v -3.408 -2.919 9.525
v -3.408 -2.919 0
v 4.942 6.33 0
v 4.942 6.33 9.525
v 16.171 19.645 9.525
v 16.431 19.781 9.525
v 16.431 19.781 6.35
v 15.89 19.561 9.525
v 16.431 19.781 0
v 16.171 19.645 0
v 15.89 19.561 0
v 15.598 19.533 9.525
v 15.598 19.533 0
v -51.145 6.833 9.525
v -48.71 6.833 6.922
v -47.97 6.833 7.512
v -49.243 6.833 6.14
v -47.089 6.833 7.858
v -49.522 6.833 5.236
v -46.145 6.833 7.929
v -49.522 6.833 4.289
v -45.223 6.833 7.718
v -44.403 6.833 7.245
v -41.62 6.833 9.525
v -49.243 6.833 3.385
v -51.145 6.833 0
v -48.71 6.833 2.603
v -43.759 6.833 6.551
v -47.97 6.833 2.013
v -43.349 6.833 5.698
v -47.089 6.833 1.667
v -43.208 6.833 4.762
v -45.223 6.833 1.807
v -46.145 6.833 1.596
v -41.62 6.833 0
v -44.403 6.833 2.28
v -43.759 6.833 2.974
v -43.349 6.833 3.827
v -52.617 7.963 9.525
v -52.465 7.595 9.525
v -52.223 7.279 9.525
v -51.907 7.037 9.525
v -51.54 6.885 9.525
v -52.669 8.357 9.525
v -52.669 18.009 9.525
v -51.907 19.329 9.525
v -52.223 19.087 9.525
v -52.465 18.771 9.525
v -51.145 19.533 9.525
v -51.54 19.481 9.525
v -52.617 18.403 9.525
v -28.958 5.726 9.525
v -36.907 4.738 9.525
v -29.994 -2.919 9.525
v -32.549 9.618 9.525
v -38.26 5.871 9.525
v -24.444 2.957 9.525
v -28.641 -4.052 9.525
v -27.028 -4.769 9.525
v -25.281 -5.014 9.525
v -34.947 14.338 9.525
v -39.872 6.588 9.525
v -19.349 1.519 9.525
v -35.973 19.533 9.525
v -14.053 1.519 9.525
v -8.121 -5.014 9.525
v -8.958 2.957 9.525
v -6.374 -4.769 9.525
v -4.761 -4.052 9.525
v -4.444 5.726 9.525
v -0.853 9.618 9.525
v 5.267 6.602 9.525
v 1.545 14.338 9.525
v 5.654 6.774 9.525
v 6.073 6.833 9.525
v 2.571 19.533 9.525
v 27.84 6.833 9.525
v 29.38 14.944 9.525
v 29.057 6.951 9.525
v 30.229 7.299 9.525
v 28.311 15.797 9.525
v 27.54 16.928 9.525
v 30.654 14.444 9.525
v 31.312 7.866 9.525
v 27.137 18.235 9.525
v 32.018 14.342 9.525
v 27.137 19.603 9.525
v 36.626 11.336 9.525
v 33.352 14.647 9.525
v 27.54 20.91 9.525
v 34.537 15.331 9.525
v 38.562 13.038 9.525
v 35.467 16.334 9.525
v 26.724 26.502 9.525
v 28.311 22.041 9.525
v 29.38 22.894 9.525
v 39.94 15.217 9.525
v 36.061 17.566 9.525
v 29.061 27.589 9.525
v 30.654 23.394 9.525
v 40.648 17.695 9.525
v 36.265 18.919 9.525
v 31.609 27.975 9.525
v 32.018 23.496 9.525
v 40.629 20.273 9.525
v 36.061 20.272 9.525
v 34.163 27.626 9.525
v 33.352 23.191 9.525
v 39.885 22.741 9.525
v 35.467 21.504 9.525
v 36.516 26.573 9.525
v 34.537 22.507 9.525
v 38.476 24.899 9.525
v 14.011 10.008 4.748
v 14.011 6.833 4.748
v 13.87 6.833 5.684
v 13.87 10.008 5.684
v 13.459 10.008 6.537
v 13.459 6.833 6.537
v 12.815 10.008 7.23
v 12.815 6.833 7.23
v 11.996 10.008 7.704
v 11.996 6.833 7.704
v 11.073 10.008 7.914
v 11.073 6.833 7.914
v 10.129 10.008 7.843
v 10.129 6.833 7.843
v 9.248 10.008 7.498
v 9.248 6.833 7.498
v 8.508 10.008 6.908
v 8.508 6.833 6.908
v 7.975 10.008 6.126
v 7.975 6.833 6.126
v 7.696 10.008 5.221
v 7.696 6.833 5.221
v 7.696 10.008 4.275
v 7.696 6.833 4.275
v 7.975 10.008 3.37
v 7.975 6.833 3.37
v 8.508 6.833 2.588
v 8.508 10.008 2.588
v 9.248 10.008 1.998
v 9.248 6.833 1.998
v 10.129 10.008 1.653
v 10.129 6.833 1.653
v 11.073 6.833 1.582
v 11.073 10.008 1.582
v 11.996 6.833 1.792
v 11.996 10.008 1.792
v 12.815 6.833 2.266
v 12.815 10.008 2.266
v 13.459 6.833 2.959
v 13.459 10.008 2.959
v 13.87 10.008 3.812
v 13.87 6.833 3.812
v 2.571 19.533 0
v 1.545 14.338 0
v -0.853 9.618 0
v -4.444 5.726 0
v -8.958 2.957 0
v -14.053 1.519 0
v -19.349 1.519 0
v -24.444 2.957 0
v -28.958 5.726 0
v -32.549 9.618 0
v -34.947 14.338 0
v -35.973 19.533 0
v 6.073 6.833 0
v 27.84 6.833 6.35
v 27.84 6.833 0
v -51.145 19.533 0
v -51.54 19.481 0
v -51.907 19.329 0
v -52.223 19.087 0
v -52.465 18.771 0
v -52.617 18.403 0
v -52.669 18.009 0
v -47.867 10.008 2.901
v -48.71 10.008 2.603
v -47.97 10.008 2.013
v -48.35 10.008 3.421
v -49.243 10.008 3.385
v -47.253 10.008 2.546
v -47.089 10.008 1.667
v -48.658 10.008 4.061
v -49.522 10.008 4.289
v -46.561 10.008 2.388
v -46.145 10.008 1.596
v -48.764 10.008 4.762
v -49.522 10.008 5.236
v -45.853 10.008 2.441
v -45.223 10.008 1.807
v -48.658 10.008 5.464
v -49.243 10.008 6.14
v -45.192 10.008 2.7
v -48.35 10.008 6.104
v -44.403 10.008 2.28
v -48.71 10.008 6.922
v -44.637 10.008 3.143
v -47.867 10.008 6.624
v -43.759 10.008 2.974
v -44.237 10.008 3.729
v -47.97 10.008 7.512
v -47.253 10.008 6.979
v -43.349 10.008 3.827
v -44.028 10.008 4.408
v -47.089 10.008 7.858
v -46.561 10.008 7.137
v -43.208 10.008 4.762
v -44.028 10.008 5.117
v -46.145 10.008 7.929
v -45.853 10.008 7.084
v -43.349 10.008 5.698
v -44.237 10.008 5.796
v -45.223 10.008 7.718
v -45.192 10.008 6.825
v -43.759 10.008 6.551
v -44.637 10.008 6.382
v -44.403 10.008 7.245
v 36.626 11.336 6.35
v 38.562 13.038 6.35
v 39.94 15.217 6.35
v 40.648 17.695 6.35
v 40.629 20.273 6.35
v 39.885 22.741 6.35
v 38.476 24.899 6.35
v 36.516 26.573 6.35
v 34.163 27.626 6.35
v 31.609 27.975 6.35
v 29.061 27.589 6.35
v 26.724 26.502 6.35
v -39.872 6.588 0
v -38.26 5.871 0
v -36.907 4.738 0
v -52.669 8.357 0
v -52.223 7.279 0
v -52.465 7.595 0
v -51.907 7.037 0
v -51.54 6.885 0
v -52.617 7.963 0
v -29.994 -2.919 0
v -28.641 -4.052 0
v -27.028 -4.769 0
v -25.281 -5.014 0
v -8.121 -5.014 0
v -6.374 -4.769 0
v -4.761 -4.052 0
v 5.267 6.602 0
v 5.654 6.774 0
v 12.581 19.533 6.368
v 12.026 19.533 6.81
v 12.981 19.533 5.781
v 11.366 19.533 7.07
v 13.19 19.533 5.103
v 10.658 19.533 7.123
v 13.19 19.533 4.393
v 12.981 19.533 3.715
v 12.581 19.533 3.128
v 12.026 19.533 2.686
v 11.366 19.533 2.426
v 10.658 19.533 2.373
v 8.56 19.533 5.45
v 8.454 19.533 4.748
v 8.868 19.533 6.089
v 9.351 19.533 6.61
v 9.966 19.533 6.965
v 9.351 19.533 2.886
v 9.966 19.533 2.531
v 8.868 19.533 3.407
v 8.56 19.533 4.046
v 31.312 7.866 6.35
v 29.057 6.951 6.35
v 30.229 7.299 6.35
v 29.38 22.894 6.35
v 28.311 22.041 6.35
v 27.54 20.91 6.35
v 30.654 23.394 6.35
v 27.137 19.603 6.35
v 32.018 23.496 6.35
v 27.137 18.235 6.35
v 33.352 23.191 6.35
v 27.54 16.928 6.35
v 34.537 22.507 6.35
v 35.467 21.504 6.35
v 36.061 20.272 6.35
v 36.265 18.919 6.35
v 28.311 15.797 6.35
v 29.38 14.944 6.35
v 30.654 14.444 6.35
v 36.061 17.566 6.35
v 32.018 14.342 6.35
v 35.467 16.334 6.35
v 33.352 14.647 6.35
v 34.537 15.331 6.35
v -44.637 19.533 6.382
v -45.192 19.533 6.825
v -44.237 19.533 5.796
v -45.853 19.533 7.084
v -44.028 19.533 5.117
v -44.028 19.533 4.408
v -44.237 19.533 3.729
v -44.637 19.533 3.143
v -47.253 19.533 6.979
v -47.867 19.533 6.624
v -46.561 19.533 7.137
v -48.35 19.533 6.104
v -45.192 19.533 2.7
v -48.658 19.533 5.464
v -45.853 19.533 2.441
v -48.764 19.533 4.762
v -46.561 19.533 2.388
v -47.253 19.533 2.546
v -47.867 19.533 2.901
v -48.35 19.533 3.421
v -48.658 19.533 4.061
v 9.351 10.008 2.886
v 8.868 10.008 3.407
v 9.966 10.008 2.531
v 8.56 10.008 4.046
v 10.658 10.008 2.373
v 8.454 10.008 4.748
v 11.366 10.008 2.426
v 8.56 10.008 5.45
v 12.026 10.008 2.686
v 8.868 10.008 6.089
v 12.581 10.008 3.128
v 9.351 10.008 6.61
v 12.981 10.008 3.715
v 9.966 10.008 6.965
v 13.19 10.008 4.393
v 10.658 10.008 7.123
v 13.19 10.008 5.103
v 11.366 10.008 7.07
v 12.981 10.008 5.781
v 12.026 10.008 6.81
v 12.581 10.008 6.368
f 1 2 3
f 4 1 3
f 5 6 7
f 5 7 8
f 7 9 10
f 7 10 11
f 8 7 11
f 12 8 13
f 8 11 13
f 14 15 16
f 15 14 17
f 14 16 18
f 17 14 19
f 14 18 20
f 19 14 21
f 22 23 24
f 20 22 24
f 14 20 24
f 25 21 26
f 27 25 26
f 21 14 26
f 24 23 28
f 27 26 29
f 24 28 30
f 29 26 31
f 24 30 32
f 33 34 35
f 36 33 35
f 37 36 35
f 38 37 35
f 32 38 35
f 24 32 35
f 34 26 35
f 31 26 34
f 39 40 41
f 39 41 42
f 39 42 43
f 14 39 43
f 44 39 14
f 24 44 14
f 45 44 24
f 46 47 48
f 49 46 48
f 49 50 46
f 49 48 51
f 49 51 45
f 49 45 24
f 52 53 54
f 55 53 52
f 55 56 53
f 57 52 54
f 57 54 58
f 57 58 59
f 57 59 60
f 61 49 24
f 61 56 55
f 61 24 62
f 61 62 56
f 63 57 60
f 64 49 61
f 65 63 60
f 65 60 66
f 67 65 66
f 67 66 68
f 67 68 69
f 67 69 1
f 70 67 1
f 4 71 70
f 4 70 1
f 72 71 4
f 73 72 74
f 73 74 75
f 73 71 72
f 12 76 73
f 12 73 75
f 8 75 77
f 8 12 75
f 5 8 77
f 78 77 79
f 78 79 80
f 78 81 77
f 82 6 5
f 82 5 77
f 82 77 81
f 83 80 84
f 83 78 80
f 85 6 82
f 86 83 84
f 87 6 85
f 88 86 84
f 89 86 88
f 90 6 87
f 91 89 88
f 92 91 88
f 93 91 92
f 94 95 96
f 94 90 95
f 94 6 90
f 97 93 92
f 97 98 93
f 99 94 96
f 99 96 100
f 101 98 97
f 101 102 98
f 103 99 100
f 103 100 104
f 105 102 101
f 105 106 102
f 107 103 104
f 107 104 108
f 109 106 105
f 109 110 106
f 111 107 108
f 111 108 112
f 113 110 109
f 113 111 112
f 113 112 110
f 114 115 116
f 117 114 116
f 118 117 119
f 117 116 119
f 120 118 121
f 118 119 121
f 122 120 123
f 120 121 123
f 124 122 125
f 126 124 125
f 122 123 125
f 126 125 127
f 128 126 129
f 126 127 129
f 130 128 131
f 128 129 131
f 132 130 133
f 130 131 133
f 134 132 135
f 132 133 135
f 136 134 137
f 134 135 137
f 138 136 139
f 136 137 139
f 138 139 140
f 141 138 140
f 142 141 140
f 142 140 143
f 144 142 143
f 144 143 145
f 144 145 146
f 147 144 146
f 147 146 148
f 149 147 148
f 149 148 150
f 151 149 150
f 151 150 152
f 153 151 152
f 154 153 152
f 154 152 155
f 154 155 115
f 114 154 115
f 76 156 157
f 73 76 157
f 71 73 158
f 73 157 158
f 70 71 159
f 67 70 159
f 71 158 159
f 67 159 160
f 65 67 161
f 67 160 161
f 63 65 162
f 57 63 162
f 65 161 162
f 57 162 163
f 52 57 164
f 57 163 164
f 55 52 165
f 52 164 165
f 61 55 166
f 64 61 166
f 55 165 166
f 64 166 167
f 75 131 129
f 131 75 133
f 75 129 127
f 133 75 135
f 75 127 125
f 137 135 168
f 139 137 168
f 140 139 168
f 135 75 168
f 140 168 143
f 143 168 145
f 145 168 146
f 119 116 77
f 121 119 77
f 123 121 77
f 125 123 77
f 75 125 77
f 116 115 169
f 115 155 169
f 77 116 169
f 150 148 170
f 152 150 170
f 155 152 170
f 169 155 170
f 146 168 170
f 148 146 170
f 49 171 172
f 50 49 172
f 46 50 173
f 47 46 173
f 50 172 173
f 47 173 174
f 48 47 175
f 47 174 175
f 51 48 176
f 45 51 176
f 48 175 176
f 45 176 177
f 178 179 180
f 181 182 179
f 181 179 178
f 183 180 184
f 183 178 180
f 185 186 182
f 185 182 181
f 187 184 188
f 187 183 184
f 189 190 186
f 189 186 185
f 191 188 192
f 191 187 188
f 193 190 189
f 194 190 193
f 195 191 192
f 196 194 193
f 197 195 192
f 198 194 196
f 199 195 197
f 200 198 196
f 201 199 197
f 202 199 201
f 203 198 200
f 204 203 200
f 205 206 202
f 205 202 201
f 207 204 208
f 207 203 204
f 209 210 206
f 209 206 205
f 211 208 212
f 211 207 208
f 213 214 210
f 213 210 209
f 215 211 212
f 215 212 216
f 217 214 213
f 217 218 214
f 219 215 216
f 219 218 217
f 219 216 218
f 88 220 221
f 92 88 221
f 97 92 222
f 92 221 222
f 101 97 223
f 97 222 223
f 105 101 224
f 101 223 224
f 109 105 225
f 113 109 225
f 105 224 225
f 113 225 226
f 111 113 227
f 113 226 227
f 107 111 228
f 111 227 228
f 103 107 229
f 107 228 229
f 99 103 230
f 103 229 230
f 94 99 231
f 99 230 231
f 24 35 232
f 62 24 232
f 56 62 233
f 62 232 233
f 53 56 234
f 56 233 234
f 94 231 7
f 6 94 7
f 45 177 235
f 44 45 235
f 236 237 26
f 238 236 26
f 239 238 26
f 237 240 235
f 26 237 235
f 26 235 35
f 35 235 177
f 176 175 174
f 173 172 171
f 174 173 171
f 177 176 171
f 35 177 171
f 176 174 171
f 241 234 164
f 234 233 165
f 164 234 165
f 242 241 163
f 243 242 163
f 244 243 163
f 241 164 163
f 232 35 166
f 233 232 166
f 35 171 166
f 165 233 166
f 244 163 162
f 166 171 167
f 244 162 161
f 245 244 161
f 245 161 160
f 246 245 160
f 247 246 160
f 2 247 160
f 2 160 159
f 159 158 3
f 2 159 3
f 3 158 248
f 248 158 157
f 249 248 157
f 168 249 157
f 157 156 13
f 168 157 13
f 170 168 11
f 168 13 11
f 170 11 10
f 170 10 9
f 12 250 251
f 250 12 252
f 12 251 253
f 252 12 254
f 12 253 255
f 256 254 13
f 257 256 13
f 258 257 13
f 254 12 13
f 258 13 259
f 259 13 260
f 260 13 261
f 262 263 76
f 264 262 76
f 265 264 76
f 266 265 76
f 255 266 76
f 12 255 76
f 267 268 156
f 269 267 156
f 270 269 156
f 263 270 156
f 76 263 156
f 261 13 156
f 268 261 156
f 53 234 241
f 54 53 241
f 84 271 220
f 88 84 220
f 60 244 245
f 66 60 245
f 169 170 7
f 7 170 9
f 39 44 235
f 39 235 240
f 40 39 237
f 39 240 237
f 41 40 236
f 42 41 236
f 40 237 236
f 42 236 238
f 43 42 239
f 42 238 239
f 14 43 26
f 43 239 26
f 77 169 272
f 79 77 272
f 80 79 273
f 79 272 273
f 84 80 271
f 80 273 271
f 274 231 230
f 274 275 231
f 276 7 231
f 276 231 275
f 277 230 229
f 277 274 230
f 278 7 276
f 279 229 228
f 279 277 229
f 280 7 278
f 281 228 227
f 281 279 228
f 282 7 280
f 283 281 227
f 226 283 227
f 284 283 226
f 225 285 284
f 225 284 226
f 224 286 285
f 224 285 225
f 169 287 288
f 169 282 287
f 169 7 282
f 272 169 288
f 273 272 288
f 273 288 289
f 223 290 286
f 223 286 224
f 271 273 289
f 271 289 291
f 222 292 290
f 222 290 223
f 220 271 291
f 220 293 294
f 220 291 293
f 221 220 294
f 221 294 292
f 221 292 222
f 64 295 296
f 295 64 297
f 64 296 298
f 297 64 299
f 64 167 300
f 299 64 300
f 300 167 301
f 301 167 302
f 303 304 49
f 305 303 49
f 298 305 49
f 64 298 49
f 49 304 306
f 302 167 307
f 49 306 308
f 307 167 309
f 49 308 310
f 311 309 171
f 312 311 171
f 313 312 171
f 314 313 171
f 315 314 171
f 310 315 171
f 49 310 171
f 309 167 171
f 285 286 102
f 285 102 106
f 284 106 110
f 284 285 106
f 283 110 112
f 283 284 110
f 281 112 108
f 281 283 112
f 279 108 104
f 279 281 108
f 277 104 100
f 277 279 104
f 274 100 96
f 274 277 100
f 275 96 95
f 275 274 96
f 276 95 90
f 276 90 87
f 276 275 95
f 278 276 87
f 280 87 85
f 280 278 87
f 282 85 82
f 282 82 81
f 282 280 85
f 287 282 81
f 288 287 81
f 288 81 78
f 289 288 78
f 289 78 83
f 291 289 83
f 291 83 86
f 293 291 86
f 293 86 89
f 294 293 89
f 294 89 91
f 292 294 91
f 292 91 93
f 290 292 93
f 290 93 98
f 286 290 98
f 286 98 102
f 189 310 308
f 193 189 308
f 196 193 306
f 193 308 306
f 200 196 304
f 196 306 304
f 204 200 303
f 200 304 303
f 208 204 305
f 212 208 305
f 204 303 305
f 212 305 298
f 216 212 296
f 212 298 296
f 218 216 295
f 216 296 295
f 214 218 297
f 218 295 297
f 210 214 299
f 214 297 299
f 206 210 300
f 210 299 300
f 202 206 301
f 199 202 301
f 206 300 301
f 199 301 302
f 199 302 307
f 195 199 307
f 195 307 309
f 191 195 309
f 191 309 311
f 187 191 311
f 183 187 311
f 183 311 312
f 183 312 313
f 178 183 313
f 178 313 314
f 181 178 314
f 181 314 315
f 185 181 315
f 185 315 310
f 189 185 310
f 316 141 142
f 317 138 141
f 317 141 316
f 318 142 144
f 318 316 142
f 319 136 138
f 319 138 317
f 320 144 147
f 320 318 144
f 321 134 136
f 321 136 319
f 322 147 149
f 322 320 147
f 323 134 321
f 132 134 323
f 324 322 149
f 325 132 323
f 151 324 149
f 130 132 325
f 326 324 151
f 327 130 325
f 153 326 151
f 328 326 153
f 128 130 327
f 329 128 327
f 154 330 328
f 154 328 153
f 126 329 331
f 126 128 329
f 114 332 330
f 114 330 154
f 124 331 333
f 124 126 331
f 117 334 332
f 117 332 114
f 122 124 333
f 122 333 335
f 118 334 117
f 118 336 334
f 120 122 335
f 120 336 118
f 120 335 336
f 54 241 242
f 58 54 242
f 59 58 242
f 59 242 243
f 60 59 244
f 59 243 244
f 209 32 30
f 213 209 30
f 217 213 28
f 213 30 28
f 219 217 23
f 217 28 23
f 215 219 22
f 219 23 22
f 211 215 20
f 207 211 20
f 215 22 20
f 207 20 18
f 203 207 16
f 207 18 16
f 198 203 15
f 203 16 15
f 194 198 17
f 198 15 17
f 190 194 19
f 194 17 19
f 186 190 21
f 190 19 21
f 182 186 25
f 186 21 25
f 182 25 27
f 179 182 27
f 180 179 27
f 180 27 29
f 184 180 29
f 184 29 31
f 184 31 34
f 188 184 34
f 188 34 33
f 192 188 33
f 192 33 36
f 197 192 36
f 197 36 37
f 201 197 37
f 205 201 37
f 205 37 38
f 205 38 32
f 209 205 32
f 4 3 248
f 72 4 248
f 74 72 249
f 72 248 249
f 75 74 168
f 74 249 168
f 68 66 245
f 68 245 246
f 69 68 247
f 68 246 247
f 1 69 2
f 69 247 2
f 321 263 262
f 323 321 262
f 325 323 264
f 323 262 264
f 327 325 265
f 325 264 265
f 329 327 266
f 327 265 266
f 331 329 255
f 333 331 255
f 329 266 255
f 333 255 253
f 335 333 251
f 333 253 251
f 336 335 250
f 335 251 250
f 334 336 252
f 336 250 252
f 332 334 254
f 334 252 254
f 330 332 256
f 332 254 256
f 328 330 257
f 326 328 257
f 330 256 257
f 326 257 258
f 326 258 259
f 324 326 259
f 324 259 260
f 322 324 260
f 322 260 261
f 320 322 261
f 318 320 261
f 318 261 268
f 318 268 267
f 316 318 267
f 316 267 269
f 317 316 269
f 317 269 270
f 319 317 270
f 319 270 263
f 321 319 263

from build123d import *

# Parameters (mm, degrees)
F0_R           = 4.58966
F1_DEPTH       = 9.525
F2_R           = 4.58966
F3_DEPTH       = 6.35
F5_D           = 4.7625
F5_DEPTH       = 12.7
F5_CBORE_D     = 6.35
F5_CBORE_DEPTH = 3.175


with BuildPart() as f1:
    # F0 (on Top) → F1 (new body)
    with BuildSketch(Plane.XY):
        with BuildLine():
            Line((31.311959, 7.866156), (36.626371, 11.336331))
            ThreePointArc((36.626371, 11.336331), (39.257746, 23.870263), (26.723814, 26.501637))
            Line((26.723814, 26.501637), (16.431446, 19.780984))
            ThreePointArc((16.431446, 19.780984), (16.032886, 19.596337), (15.598217, 19.533035))
            Line((15.598217, 19.533035), (2.571234, 19.533035))
            ThreePointArc((2.571234, 19.533035), (-16.700992, 1.336157), (-35.973218, 19.533035))
            Line((-35.973218, 19.533035), (-51.14509, 19.533035))
            ThreePointArc((-51.14509, 19.533035), (-52.22272, 19.086666), (-52.66909, 18.009035))
            Line((-52.66909, 18.009035), (-52.66909, 8.357035))
            ThreePointArc((-52.66909, 8.357035), (-52.22272, 7.279404), (-51.14509, 6.833035))
            Line((-51.14509, 6.833035), (-41.62009, 6.833035))
            ThreePointArc((-41.62009, 6.833035), (-39.04111, 6.285738), (-36.906687, 4.738189))
            Line((-36.906687, 4.738189), (-29.993949, -2.918997))
            ThreePointArc((-29.993949, -2.918997), (-27.859527, -4.466546), (-25.280547, -5.013843))
            Line((-25.280547, -5.013843), (-8.121436, -5.013843))
            ThreePointArc((-8.121436, -5.013843), (-5.542457, -4.466546), (-3.408034, -2.918997))
            Line((-3.408034, -2.918997), (4.942001, 6.330272))
            ThreePointArc((4.942001, 6.330272), (5.454262, 6.701684), (6.073217, 6.833035))
            Line((6.073217, 6.833035), (27.840173, 6.833035))
            ThreePointArc((27.840173, 6.833035), (29.651294, 7.096793), (31.311959, 7.866156))
        make_face()
        with Locations((31.675093, 18.918984)):
            Circle(F0_R, mode=Mode.SUBTRACT)
    extrude(amount=F1_DEPTH)

    # F2 (on face) → F3 (cut)
    with BuildSketch(Plane(origin=(0, 0, 0), x_dir=(1, 0, 0), z_dir=(0, 0, -1))):
        with BuildLine():
            Line((27.840173, -6.833035), (16.431446, -19.780984))
            Line((16.431446, -19.780984), (26.723814, -26.501637))
            ThreePointArc((26.723814, -26.501637), (39.257746, -23.870263), (36.626371, -11.336331))
            Line((36.626371, -11.336331), (31.311959, -7.866156))
            ThreePointArc((31.311959, -7.866156), (29.651294, -7.096793), (27.840173, -6.833035))
        make_face()
        with Locations((31.675093, -18.918984)):
            Circle(F2_R, mode=Mode.SUBTRACT)
    extrude(amount=-F3_DEPTH, mode=Mode.SUBTRACT)

    # F5
    with Locations(Plane.XZ.offset(-6.833035)):
        with Locations((-46.38259, 4.7625), (10.835717, 4.74801)):
            CounterBoreHole(F5_D / 2, F5_CBORE_D / 2, F5_CBORE_DEPTH, depth=F5_DEPTH)


solid = f1.part
